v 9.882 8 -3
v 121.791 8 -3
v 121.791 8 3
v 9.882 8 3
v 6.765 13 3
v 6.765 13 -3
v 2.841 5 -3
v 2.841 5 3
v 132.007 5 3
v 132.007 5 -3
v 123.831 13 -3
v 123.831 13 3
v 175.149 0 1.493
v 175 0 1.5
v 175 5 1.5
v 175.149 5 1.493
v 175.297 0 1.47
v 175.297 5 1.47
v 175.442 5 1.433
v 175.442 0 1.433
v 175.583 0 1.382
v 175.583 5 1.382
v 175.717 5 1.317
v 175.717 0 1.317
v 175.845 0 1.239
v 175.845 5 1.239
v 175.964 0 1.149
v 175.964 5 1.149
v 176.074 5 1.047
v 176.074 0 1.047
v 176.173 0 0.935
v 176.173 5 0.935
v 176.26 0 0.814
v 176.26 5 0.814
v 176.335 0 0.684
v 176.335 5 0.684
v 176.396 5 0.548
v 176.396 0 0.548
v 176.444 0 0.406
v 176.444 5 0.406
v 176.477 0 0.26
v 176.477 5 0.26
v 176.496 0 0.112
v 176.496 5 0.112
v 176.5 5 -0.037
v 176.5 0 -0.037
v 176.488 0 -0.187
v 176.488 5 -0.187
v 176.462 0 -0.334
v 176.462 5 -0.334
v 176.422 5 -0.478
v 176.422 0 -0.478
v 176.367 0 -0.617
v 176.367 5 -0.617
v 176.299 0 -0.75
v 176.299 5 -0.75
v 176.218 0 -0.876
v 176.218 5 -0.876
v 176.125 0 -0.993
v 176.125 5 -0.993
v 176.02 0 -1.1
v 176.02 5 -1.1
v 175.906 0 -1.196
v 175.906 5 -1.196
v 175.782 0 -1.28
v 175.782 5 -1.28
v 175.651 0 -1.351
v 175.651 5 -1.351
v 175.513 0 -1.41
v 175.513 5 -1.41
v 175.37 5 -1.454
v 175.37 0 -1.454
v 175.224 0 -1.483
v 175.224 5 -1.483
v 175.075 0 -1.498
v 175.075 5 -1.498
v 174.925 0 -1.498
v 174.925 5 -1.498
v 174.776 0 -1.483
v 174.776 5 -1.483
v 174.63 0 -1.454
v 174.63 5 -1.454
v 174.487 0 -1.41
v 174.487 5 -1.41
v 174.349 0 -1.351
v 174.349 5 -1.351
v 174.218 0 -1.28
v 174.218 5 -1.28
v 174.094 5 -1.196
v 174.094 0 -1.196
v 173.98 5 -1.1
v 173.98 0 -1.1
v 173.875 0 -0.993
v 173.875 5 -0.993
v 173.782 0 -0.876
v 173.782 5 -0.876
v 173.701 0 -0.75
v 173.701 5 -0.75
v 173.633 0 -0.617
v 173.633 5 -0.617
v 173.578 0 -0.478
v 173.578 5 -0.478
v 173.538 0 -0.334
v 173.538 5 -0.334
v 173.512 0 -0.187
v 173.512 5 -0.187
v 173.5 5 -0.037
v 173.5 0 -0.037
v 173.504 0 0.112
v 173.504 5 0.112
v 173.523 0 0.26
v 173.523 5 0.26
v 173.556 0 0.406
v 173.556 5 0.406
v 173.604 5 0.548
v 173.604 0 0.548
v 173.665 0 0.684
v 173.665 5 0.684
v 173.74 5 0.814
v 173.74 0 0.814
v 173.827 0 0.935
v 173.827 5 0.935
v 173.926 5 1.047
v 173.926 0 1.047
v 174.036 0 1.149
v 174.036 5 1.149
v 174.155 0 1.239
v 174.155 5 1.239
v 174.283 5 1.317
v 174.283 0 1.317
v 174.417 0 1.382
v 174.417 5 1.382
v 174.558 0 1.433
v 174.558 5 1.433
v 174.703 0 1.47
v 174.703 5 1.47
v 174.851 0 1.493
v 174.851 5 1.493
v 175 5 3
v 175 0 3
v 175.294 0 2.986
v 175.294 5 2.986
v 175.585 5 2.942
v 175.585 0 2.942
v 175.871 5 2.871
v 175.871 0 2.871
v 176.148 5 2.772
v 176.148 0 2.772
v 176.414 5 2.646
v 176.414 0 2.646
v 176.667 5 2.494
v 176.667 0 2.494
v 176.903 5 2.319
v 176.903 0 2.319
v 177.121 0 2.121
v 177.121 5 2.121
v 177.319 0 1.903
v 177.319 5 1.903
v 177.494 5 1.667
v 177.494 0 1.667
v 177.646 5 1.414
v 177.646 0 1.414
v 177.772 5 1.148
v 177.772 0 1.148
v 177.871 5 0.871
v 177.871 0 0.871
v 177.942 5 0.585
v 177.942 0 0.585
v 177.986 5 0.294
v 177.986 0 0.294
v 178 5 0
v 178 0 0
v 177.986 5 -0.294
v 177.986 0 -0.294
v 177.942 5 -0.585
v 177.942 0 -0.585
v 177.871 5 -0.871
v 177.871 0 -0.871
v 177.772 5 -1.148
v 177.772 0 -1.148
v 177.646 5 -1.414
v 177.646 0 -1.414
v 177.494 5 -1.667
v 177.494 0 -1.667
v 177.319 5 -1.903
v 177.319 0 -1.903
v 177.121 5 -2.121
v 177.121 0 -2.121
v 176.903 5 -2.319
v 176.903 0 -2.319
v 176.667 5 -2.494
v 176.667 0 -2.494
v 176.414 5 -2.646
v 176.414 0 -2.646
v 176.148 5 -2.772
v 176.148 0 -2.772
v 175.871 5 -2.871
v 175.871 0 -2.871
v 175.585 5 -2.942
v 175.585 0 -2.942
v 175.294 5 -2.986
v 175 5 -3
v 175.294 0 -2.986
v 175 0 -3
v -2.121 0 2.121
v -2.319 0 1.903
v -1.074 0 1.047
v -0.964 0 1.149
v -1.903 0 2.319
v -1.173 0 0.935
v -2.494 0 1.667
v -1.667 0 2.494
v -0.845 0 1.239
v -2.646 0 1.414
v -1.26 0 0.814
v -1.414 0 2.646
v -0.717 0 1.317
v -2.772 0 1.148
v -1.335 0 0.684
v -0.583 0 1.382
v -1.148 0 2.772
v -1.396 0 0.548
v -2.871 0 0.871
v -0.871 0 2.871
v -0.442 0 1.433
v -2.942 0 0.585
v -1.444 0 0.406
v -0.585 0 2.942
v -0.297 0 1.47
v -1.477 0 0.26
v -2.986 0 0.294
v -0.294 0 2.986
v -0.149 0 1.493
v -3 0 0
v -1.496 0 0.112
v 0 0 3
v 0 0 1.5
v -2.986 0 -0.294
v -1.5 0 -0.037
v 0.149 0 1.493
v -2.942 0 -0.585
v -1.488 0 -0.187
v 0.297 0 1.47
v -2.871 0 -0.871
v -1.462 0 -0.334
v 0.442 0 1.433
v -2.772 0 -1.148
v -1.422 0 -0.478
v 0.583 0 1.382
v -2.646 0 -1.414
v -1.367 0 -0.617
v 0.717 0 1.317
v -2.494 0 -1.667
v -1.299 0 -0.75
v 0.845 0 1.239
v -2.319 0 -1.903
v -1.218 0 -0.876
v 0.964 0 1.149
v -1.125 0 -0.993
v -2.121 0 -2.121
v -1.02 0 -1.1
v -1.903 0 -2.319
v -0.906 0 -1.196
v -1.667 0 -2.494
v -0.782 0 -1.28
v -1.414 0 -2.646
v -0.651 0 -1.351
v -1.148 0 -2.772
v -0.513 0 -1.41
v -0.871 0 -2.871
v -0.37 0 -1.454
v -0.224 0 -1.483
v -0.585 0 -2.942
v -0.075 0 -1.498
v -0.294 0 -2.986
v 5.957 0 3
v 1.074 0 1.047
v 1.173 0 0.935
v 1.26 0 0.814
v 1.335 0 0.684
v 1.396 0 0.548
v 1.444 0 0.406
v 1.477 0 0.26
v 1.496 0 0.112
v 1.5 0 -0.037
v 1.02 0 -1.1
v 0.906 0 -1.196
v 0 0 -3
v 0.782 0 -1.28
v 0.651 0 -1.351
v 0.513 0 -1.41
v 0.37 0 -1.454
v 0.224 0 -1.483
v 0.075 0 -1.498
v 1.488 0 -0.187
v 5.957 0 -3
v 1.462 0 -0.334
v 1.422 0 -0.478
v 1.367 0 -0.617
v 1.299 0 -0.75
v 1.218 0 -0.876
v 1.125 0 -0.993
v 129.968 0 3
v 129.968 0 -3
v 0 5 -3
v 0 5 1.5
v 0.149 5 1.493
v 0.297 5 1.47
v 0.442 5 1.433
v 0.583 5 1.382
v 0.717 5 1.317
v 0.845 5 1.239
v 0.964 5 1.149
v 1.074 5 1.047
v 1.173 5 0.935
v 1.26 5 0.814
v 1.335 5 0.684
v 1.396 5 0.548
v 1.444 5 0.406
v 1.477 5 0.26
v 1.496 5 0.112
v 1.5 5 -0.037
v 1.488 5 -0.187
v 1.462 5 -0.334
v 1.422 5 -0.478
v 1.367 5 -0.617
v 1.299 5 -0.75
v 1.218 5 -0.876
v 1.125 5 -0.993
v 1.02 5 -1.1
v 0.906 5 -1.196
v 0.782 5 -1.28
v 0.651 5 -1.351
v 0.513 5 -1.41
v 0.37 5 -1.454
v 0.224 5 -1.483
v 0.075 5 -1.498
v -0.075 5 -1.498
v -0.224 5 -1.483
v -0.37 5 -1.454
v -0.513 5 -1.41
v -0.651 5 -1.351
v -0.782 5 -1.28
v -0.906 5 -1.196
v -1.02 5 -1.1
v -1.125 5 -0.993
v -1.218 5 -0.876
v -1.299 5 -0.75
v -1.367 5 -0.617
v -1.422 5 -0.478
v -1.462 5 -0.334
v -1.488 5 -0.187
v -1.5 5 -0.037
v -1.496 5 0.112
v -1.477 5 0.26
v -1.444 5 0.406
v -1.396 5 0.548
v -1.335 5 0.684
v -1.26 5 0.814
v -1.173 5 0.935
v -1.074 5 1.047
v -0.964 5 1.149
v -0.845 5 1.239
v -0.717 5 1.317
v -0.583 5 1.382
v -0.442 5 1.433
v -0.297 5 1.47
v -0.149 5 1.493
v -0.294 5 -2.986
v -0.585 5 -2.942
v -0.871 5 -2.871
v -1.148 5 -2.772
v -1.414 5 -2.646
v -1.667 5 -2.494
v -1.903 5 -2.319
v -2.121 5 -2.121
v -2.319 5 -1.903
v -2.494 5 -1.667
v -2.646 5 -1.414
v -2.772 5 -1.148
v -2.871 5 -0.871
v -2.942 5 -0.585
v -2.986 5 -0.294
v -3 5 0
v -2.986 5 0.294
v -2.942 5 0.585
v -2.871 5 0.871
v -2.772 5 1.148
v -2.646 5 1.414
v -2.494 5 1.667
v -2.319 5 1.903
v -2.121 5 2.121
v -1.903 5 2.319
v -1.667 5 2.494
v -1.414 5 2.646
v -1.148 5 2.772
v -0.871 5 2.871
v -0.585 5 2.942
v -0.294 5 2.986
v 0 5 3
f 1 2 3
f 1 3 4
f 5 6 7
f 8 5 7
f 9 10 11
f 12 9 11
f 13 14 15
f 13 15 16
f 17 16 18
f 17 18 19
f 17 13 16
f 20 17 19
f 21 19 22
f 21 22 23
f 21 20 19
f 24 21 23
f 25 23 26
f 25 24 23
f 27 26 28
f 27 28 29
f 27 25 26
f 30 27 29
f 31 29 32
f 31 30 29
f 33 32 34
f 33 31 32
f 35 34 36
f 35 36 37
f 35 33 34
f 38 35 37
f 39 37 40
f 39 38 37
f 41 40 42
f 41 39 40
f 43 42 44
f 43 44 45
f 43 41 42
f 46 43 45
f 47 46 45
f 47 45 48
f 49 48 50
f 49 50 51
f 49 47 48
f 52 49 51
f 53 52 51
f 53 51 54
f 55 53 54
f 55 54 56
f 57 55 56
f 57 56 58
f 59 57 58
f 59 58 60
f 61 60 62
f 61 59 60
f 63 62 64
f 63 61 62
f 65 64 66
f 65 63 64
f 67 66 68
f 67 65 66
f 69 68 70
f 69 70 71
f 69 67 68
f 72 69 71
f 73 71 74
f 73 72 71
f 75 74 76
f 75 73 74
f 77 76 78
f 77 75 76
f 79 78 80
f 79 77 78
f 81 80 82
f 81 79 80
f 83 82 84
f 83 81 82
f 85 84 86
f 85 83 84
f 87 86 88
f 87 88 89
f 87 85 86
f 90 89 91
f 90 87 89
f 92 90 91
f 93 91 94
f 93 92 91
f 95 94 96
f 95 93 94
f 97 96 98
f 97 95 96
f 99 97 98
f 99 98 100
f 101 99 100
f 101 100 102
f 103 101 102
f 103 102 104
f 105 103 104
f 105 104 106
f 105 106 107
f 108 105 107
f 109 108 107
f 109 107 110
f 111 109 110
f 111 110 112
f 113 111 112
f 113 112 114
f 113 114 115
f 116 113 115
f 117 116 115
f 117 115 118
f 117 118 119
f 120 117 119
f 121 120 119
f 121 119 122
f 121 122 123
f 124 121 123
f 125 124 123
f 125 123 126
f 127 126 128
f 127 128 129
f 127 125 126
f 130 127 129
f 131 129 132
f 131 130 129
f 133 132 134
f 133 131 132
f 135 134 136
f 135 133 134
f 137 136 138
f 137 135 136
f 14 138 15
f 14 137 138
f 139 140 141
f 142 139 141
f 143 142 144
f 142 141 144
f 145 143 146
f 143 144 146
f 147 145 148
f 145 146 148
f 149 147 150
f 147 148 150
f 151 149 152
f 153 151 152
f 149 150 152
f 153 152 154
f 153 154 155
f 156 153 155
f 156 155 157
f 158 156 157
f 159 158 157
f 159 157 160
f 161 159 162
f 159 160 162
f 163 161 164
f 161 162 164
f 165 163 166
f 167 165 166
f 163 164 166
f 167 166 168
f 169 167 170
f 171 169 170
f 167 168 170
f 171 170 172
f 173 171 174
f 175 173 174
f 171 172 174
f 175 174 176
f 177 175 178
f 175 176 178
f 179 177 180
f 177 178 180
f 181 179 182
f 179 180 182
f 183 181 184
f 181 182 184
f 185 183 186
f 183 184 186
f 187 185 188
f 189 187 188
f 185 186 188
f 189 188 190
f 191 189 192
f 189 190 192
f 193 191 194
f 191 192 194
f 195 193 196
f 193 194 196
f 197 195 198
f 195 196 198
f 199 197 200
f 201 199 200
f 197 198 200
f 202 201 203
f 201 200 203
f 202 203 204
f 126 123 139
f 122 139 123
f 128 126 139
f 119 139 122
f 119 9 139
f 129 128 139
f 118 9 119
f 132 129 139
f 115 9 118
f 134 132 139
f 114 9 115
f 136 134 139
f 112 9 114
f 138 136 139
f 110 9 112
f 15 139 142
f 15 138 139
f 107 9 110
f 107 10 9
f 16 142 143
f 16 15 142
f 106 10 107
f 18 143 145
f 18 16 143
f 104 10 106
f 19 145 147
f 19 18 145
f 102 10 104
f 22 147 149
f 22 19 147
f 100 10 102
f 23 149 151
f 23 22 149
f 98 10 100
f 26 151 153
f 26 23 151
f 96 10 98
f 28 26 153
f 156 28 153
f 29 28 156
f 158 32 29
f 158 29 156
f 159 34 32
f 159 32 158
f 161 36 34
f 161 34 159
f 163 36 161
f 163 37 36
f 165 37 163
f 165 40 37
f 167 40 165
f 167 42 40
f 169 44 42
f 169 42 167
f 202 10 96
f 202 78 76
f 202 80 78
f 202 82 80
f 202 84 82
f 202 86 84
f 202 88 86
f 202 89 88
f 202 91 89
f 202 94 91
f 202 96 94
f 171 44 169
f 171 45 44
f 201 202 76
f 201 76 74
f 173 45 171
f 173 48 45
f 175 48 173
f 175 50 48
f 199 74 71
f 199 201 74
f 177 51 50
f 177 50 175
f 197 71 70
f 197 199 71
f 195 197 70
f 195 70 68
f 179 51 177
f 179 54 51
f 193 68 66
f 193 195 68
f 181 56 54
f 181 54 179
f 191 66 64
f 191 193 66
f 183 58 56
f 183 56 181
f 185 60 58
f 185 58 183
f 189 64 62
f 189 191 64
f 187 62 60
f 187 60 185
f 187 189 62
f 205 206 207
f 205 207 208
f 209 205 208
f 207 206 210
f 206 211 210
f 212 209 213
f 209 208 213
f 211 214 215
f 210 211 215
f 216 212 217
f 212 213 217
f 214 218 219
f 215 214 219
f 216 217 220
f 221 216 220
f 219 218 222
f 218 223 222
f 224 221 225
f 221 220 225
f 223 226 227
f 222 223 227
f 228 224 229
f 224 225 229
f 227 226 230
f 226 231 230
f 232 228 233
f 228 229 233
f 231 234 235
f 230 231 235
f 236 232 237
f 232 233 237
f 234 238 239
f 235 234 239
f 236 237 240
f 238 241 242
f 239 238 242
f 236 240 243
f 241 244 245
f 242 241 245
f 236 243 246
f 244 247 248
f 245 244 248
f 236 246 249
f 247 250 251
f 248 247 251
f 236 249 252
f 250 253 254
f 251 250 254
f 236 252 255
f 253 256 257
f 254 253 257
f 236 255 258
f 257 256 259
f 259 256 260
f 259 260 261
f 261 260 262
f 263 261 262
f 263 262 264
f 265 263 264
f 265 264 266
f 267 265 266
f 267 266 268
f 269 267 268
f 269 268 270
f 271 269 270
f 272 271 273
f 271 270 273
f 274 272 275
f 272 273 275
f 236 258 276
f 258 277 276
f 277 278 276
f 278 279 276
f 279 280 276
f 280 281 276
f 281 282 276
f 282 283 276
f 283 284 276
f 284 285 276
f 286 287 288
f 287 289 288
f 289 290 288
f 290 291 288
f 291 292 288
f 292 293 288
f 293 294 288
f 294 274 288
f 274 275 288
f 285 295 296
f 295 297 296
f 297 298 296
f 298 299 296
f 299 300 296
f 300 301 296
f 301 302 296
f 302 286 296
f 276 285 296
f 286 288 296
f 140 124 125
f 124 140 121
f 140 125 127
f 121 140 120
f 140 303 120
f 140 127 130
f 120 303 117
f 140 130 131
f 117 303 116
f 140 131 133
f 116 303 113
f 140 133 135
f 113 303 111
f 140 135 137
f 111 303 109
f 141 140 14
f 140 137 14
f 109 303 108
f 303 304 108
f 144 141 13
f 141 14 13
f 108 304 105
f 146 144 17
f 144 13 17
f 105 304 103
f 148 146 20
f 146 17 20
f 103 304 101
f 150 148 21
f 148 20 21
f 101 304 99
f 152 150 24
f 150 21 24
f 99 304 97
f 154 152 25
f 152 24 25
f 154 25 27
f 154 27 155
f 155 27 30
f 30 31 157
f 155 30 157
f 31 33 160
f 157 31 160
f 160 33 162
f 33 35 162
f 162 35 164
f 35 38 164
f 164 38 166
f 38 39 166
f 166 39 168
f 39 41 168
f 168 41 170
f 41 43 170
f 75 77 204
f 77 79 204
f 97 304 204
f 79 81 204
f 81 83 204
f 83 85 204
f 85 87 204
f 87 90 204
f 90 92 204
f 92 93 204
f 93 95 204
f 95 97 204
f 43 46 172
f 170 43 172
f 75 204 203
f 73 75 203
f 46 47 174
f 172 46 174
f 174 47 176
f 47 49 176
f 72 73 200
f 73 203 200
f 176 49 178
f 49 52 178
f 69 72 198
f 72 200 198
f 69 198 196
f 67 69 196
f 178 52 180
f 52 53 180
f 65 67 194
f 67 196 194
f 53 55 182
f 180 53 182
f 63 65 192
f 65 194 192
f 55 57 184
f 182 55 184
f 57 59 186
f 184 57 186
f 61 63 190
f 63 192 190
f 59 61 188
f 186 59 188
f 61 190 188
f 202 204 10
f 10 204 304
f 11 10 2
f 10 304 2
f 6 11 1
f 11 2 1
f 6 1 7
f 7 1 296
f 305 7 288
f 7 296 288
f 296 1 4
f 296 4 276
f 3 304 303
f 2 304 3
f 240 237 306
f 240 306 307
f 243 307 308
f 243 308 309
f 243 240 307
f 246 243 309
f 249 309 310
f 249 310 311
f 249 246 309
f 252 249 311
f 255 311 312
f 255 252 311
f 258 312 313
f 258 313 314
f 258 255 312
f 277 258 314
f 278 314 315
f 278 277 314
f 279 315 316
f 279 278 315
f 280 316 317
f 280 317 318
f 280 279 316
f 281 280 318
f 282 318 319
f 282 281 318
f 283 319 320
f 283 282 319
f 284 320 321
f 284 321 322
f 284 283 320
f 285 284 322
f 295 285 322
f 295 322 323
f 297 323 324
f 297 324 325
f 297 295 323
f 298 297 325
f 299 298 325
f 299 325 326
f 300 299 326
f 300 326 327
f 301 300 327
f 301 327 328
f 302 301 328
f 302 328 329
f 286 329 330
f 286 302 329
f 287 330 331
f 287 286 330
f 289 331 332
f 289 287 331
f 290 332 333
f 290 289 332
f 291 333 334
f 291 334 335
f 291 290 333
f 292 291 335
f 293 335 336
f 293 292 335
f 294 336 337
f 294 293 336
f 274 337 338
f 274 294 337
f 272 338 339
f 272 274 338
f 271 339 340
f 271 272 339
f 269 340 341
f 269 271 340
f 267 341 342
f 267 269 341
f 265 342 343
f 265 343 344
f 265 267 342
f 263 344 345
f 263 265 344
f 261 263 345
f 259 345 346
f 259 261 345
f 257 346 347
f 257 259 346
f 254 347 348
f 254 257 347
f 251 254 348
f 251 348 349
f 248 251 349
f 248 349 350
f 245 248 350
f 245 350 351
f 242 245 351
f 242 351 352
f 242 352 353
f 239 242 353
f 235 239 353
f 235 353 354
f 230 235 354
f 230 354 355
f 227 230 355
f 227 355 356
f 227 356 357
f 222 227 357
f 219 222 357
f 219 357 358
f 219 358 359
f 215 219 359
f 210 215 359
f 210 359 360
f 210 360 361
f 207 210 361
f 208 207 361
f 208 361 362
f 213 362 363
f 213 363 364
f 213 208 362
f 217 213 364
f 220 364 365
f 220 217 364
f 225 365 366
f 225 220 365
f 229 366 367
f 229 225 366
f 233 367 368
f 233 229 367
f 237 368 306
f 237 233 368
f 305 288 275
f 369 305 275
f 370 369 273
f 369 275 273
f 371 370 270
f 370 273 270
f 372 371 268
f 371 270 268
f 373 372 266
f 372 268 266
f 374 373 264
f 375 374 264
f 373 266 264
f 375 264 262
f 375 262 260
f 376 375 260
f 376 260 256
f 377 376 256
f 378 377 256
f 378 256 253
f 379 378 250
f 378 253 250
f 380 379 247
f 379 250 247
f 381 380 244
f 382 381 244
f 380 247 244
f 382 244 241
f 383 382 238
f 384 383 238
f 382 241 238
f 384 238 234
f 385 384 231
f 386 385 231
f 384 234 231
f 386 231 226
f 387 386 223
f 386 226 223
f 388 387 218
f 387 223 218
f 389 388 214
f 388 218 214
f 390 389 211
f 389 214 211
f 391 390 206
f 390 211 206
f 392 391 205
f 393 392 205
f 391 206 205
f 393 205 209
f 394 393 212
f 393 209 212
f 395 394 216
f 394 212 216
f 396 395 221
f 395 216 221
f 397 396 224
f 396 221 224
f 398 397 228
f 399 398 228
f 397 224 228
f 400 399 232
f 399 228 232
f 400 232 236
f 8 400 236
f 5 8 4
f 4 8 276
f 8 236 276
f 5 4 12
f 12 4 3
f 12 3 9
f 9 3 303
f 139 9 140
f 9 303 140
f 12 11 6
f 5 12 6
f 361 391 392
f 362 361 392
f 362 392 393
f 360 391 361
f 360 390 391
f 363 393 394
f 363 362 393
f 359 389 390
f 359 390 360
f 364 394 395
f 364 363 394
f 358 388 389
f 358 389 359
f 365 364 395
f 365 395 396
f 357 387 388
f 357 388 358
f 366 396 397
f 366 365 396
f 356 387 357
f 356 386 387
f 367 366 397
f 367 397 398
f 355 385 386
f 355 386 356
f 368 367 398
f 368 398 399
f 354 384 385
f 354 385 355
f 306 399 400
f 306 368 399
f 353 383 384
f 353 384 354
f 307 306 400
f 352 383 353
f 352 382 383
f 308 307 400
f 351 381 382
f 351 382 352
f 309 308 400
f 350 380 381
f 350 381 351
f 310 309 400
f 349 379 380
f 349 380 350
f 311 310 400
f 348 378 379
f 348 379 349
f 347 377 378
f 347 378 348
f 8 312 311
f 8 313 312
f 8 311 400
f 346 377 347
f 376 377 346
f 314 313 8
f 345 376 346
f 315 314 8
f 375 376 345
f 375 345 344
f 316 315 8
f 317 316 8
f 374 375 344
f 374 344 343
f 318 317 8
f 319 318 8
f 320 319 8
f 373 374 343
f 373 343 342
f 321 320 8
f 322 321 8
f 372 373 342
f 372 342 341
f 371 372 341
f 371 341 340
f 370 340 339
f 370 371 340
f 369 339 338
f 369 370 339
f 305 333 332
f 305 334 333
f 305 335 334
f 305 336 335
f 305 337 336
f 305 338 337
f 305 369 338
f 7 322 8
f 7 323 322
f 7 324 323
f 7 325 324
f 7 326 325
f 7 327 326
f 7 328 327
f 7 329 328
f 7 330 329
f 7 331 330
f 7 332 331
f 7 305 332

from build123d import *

# Parameters (mm, degrees)
CROQUIS1_R              = 1.5
SALIENTE_EXTRUIR1_DEPTH = 5
SALIENTE_EXTRUIR2_DEPTH = 6
CORTAR_EXTRUIR2_DEPTH   = 22


with BuildPart() as part:
    # Croquis1 → Saliente-Extruir1 (new body)
    with BuildSketch(Plane(origin=(0, 0, 0), x_dir=(1, 0, 0), z_dir=(0, 1, 0))):
        with BuildLine():
            Line((175, 3), (0, 3))
            ThreePointArc((0, 3), (-3, 0), (0, -3))
            Line((0, -3), (175, -3))
            ThreePointArc((175, -3), (178, 0), (175, 3))
        make_face()
        with Locations(Location((0, 0, 0), (0, 0, 270))):
            Circle(CROQUIS1_R, mode=Mode.SUBTRACT)
        with Locations(Location((175, 0, 0), (0, 0, 270))):
            Circle(CROQUIS1_R, mode=Mode.SUBTRACT)
    extrude(amount=SALIENTE_EXTRUIR1_DEPTH)

    # Croquis2 → Saliente-Extruir2 (add)
    with BuildSketch(Plane(origin=(0, 0, -3), x_dir=(-1, 0, 0), z_dir=(0, 0, -1))):
        Polygon((-132.006982503, 5), (-123.830535375, 13), (-6.765193463, 13), (-2.840646017, 5), (-120, 5), align=None)
    extrude(amount=-SALIENTE_EXTRUIR2_DEPTH)

    # Croquis4 → Cortar-Extruir2 (cut)
    with BuildSketch(Plane(origin=(0, 0, -3), x_dir=(-1, 0, 0), z_dir=(0, 0, -1))):
        Polygon((-9.88159135, 8), (-3.108751036, -5.80610714), (-63.338491444, -7.280350793), (-136.266049088, -6.162343586), (-121.791342394, 8), align=None)
    extrude(amount=-CORTAR_EXTRUIR2_DEPTH, mode=Mode.SUBTRACT)


solid = part.part
